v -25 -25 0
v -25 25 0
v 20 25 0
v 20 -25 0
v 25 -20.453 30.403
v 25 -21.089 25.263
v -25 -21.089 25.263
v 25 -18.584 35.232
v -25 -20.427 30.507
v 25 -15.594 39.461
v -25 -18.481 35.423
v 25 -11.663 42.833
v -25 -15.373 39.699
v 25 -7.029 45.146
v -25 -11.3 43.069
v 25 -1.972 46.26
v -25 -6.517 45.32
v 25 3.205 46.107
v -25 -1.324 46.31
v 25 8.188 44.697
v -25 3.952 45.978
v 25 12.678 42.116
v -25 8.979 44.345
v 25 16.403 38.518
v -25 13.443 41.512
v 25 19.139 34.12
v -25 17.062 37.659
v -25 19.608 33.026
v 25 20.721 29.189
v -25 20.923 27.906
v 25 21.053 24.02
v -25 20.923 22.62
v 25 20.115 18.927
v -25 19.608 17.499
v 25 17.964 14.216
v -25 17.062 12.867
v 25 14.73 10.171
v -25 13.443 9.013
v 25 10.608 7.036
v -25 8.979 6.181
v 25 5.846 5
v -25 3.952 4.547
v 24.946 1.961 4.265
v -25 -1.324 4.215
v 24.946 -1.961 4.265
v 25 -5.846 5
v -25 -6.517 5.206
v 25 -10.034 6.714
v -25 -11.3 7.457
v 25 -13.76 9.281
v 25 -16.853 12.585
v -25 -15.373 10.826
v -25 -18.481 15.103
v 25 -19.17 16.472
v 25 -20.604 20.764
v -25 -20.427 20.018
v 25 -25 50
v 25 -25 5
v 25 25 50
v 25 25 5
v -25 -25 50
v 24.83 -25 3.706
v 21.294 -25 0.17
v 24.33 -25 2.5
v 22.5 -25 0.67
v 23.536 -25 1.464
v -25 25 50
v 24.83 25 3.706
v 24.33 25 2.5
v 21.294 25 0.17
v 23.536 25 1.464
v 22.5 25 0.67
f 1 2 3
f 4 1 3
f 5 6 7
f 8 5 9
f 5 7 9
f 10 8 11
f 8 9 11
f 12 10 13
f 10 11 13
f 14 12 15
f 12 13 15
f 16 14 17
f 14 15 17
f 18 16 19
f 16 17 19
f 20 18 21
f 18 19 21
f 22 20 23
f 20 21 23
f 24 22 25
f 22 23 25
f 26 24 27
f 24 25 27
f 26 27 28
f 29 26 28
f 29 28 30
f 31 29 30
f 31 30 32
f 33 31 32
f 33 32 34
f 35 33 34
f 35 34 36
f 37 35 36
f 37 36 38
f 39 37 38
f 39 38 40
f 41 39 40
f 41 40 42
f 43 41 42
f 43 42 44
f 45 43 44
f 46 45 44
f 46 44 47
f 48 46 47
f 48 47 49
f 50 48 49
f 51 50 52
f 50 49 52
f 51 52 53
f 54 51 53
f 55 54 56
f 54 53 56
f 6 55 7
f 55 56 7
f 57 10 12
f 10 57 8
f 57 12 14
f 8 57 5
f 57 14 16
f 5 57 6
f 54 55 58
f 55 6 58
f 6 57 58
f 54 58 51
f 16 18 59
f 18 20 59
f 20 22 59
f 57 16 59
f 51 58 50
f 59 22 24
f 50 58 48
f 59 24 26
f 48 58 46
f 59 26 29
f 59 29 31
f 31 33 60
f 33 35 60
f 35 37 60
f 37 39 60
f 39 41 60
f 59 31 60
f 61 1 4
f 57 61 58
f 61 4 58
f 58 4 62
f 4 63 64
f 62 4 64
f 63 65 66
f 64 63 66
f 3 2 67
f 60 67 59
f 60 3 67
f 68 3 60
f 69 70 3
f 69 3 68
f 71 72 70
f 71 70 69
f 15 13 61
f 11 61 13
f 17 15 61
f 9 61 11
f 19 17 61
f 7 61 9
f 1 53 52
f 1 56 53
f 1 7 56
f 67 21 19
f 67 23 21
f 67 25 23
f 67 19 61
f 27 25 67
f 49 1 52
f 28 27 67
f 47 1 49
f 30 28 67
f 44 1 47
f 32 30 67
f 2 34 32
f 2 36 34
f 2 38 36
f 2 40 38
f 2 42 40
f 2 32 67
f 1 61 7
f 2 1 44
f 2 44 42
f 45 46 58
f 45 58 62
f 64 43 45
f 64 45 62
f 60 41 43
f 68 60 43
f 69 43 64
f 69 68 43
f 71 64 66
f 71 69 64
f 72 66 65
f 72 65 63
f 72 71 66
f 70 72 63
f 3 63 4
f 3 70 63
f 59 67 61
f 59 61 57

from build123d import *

# Parameters (mm, degrees)
F0_W        = 50
F0_H        = 50
F1_DEPTH    = 50
F2_R        = 21.0892085761
F4_DEPTH    = 50.001
F3_T1_DEPTH = 75


# Not quite as in the source:
# - a fillet or chamfer that OpenCascade refuses, or shapes differently, is made with other operations: its cross-section is extruded or revolved along the edge and cut away or added


with BuildPart() as f1:
    # F0 (on Top) → F1 (new body)
    with BuildSketch(Plane.XY):
        Rectangle(F0_W, F0_H)
    extrude(amount=F1_DEPTH)

    # F2 (on face) → F4 (cut, through all)
    with BuildSketch(Plane(origin=(-25, 0, 0), x_dir=(0, -1, 0), z_dir=(-1, 0, 0))):
        with Locations((0, 25.2627544105)):
            Circle(F2_R)
    extrude(amount=-F4_DEPTH, mode=Mode.SUBTRACT)

    # F3: fillet of radius 5 on 1 edges, made by hand

    # F3_s2 → F3_t1 (cut)
    with BuildSketch(Plane.XZ.offset(-37.5)):
        with BuildLine():
            ThreePointArc((25, 5), (23.5355339059, 1.4644660941), (20, 0))
            Line((20, 0), (25, 0))
            Line((25, 0), (25, 5))
        make_face()
    extrude(amount=F3_T1_DEPTH, mode=Mode.SUBTRACT)


solid = f1.part
